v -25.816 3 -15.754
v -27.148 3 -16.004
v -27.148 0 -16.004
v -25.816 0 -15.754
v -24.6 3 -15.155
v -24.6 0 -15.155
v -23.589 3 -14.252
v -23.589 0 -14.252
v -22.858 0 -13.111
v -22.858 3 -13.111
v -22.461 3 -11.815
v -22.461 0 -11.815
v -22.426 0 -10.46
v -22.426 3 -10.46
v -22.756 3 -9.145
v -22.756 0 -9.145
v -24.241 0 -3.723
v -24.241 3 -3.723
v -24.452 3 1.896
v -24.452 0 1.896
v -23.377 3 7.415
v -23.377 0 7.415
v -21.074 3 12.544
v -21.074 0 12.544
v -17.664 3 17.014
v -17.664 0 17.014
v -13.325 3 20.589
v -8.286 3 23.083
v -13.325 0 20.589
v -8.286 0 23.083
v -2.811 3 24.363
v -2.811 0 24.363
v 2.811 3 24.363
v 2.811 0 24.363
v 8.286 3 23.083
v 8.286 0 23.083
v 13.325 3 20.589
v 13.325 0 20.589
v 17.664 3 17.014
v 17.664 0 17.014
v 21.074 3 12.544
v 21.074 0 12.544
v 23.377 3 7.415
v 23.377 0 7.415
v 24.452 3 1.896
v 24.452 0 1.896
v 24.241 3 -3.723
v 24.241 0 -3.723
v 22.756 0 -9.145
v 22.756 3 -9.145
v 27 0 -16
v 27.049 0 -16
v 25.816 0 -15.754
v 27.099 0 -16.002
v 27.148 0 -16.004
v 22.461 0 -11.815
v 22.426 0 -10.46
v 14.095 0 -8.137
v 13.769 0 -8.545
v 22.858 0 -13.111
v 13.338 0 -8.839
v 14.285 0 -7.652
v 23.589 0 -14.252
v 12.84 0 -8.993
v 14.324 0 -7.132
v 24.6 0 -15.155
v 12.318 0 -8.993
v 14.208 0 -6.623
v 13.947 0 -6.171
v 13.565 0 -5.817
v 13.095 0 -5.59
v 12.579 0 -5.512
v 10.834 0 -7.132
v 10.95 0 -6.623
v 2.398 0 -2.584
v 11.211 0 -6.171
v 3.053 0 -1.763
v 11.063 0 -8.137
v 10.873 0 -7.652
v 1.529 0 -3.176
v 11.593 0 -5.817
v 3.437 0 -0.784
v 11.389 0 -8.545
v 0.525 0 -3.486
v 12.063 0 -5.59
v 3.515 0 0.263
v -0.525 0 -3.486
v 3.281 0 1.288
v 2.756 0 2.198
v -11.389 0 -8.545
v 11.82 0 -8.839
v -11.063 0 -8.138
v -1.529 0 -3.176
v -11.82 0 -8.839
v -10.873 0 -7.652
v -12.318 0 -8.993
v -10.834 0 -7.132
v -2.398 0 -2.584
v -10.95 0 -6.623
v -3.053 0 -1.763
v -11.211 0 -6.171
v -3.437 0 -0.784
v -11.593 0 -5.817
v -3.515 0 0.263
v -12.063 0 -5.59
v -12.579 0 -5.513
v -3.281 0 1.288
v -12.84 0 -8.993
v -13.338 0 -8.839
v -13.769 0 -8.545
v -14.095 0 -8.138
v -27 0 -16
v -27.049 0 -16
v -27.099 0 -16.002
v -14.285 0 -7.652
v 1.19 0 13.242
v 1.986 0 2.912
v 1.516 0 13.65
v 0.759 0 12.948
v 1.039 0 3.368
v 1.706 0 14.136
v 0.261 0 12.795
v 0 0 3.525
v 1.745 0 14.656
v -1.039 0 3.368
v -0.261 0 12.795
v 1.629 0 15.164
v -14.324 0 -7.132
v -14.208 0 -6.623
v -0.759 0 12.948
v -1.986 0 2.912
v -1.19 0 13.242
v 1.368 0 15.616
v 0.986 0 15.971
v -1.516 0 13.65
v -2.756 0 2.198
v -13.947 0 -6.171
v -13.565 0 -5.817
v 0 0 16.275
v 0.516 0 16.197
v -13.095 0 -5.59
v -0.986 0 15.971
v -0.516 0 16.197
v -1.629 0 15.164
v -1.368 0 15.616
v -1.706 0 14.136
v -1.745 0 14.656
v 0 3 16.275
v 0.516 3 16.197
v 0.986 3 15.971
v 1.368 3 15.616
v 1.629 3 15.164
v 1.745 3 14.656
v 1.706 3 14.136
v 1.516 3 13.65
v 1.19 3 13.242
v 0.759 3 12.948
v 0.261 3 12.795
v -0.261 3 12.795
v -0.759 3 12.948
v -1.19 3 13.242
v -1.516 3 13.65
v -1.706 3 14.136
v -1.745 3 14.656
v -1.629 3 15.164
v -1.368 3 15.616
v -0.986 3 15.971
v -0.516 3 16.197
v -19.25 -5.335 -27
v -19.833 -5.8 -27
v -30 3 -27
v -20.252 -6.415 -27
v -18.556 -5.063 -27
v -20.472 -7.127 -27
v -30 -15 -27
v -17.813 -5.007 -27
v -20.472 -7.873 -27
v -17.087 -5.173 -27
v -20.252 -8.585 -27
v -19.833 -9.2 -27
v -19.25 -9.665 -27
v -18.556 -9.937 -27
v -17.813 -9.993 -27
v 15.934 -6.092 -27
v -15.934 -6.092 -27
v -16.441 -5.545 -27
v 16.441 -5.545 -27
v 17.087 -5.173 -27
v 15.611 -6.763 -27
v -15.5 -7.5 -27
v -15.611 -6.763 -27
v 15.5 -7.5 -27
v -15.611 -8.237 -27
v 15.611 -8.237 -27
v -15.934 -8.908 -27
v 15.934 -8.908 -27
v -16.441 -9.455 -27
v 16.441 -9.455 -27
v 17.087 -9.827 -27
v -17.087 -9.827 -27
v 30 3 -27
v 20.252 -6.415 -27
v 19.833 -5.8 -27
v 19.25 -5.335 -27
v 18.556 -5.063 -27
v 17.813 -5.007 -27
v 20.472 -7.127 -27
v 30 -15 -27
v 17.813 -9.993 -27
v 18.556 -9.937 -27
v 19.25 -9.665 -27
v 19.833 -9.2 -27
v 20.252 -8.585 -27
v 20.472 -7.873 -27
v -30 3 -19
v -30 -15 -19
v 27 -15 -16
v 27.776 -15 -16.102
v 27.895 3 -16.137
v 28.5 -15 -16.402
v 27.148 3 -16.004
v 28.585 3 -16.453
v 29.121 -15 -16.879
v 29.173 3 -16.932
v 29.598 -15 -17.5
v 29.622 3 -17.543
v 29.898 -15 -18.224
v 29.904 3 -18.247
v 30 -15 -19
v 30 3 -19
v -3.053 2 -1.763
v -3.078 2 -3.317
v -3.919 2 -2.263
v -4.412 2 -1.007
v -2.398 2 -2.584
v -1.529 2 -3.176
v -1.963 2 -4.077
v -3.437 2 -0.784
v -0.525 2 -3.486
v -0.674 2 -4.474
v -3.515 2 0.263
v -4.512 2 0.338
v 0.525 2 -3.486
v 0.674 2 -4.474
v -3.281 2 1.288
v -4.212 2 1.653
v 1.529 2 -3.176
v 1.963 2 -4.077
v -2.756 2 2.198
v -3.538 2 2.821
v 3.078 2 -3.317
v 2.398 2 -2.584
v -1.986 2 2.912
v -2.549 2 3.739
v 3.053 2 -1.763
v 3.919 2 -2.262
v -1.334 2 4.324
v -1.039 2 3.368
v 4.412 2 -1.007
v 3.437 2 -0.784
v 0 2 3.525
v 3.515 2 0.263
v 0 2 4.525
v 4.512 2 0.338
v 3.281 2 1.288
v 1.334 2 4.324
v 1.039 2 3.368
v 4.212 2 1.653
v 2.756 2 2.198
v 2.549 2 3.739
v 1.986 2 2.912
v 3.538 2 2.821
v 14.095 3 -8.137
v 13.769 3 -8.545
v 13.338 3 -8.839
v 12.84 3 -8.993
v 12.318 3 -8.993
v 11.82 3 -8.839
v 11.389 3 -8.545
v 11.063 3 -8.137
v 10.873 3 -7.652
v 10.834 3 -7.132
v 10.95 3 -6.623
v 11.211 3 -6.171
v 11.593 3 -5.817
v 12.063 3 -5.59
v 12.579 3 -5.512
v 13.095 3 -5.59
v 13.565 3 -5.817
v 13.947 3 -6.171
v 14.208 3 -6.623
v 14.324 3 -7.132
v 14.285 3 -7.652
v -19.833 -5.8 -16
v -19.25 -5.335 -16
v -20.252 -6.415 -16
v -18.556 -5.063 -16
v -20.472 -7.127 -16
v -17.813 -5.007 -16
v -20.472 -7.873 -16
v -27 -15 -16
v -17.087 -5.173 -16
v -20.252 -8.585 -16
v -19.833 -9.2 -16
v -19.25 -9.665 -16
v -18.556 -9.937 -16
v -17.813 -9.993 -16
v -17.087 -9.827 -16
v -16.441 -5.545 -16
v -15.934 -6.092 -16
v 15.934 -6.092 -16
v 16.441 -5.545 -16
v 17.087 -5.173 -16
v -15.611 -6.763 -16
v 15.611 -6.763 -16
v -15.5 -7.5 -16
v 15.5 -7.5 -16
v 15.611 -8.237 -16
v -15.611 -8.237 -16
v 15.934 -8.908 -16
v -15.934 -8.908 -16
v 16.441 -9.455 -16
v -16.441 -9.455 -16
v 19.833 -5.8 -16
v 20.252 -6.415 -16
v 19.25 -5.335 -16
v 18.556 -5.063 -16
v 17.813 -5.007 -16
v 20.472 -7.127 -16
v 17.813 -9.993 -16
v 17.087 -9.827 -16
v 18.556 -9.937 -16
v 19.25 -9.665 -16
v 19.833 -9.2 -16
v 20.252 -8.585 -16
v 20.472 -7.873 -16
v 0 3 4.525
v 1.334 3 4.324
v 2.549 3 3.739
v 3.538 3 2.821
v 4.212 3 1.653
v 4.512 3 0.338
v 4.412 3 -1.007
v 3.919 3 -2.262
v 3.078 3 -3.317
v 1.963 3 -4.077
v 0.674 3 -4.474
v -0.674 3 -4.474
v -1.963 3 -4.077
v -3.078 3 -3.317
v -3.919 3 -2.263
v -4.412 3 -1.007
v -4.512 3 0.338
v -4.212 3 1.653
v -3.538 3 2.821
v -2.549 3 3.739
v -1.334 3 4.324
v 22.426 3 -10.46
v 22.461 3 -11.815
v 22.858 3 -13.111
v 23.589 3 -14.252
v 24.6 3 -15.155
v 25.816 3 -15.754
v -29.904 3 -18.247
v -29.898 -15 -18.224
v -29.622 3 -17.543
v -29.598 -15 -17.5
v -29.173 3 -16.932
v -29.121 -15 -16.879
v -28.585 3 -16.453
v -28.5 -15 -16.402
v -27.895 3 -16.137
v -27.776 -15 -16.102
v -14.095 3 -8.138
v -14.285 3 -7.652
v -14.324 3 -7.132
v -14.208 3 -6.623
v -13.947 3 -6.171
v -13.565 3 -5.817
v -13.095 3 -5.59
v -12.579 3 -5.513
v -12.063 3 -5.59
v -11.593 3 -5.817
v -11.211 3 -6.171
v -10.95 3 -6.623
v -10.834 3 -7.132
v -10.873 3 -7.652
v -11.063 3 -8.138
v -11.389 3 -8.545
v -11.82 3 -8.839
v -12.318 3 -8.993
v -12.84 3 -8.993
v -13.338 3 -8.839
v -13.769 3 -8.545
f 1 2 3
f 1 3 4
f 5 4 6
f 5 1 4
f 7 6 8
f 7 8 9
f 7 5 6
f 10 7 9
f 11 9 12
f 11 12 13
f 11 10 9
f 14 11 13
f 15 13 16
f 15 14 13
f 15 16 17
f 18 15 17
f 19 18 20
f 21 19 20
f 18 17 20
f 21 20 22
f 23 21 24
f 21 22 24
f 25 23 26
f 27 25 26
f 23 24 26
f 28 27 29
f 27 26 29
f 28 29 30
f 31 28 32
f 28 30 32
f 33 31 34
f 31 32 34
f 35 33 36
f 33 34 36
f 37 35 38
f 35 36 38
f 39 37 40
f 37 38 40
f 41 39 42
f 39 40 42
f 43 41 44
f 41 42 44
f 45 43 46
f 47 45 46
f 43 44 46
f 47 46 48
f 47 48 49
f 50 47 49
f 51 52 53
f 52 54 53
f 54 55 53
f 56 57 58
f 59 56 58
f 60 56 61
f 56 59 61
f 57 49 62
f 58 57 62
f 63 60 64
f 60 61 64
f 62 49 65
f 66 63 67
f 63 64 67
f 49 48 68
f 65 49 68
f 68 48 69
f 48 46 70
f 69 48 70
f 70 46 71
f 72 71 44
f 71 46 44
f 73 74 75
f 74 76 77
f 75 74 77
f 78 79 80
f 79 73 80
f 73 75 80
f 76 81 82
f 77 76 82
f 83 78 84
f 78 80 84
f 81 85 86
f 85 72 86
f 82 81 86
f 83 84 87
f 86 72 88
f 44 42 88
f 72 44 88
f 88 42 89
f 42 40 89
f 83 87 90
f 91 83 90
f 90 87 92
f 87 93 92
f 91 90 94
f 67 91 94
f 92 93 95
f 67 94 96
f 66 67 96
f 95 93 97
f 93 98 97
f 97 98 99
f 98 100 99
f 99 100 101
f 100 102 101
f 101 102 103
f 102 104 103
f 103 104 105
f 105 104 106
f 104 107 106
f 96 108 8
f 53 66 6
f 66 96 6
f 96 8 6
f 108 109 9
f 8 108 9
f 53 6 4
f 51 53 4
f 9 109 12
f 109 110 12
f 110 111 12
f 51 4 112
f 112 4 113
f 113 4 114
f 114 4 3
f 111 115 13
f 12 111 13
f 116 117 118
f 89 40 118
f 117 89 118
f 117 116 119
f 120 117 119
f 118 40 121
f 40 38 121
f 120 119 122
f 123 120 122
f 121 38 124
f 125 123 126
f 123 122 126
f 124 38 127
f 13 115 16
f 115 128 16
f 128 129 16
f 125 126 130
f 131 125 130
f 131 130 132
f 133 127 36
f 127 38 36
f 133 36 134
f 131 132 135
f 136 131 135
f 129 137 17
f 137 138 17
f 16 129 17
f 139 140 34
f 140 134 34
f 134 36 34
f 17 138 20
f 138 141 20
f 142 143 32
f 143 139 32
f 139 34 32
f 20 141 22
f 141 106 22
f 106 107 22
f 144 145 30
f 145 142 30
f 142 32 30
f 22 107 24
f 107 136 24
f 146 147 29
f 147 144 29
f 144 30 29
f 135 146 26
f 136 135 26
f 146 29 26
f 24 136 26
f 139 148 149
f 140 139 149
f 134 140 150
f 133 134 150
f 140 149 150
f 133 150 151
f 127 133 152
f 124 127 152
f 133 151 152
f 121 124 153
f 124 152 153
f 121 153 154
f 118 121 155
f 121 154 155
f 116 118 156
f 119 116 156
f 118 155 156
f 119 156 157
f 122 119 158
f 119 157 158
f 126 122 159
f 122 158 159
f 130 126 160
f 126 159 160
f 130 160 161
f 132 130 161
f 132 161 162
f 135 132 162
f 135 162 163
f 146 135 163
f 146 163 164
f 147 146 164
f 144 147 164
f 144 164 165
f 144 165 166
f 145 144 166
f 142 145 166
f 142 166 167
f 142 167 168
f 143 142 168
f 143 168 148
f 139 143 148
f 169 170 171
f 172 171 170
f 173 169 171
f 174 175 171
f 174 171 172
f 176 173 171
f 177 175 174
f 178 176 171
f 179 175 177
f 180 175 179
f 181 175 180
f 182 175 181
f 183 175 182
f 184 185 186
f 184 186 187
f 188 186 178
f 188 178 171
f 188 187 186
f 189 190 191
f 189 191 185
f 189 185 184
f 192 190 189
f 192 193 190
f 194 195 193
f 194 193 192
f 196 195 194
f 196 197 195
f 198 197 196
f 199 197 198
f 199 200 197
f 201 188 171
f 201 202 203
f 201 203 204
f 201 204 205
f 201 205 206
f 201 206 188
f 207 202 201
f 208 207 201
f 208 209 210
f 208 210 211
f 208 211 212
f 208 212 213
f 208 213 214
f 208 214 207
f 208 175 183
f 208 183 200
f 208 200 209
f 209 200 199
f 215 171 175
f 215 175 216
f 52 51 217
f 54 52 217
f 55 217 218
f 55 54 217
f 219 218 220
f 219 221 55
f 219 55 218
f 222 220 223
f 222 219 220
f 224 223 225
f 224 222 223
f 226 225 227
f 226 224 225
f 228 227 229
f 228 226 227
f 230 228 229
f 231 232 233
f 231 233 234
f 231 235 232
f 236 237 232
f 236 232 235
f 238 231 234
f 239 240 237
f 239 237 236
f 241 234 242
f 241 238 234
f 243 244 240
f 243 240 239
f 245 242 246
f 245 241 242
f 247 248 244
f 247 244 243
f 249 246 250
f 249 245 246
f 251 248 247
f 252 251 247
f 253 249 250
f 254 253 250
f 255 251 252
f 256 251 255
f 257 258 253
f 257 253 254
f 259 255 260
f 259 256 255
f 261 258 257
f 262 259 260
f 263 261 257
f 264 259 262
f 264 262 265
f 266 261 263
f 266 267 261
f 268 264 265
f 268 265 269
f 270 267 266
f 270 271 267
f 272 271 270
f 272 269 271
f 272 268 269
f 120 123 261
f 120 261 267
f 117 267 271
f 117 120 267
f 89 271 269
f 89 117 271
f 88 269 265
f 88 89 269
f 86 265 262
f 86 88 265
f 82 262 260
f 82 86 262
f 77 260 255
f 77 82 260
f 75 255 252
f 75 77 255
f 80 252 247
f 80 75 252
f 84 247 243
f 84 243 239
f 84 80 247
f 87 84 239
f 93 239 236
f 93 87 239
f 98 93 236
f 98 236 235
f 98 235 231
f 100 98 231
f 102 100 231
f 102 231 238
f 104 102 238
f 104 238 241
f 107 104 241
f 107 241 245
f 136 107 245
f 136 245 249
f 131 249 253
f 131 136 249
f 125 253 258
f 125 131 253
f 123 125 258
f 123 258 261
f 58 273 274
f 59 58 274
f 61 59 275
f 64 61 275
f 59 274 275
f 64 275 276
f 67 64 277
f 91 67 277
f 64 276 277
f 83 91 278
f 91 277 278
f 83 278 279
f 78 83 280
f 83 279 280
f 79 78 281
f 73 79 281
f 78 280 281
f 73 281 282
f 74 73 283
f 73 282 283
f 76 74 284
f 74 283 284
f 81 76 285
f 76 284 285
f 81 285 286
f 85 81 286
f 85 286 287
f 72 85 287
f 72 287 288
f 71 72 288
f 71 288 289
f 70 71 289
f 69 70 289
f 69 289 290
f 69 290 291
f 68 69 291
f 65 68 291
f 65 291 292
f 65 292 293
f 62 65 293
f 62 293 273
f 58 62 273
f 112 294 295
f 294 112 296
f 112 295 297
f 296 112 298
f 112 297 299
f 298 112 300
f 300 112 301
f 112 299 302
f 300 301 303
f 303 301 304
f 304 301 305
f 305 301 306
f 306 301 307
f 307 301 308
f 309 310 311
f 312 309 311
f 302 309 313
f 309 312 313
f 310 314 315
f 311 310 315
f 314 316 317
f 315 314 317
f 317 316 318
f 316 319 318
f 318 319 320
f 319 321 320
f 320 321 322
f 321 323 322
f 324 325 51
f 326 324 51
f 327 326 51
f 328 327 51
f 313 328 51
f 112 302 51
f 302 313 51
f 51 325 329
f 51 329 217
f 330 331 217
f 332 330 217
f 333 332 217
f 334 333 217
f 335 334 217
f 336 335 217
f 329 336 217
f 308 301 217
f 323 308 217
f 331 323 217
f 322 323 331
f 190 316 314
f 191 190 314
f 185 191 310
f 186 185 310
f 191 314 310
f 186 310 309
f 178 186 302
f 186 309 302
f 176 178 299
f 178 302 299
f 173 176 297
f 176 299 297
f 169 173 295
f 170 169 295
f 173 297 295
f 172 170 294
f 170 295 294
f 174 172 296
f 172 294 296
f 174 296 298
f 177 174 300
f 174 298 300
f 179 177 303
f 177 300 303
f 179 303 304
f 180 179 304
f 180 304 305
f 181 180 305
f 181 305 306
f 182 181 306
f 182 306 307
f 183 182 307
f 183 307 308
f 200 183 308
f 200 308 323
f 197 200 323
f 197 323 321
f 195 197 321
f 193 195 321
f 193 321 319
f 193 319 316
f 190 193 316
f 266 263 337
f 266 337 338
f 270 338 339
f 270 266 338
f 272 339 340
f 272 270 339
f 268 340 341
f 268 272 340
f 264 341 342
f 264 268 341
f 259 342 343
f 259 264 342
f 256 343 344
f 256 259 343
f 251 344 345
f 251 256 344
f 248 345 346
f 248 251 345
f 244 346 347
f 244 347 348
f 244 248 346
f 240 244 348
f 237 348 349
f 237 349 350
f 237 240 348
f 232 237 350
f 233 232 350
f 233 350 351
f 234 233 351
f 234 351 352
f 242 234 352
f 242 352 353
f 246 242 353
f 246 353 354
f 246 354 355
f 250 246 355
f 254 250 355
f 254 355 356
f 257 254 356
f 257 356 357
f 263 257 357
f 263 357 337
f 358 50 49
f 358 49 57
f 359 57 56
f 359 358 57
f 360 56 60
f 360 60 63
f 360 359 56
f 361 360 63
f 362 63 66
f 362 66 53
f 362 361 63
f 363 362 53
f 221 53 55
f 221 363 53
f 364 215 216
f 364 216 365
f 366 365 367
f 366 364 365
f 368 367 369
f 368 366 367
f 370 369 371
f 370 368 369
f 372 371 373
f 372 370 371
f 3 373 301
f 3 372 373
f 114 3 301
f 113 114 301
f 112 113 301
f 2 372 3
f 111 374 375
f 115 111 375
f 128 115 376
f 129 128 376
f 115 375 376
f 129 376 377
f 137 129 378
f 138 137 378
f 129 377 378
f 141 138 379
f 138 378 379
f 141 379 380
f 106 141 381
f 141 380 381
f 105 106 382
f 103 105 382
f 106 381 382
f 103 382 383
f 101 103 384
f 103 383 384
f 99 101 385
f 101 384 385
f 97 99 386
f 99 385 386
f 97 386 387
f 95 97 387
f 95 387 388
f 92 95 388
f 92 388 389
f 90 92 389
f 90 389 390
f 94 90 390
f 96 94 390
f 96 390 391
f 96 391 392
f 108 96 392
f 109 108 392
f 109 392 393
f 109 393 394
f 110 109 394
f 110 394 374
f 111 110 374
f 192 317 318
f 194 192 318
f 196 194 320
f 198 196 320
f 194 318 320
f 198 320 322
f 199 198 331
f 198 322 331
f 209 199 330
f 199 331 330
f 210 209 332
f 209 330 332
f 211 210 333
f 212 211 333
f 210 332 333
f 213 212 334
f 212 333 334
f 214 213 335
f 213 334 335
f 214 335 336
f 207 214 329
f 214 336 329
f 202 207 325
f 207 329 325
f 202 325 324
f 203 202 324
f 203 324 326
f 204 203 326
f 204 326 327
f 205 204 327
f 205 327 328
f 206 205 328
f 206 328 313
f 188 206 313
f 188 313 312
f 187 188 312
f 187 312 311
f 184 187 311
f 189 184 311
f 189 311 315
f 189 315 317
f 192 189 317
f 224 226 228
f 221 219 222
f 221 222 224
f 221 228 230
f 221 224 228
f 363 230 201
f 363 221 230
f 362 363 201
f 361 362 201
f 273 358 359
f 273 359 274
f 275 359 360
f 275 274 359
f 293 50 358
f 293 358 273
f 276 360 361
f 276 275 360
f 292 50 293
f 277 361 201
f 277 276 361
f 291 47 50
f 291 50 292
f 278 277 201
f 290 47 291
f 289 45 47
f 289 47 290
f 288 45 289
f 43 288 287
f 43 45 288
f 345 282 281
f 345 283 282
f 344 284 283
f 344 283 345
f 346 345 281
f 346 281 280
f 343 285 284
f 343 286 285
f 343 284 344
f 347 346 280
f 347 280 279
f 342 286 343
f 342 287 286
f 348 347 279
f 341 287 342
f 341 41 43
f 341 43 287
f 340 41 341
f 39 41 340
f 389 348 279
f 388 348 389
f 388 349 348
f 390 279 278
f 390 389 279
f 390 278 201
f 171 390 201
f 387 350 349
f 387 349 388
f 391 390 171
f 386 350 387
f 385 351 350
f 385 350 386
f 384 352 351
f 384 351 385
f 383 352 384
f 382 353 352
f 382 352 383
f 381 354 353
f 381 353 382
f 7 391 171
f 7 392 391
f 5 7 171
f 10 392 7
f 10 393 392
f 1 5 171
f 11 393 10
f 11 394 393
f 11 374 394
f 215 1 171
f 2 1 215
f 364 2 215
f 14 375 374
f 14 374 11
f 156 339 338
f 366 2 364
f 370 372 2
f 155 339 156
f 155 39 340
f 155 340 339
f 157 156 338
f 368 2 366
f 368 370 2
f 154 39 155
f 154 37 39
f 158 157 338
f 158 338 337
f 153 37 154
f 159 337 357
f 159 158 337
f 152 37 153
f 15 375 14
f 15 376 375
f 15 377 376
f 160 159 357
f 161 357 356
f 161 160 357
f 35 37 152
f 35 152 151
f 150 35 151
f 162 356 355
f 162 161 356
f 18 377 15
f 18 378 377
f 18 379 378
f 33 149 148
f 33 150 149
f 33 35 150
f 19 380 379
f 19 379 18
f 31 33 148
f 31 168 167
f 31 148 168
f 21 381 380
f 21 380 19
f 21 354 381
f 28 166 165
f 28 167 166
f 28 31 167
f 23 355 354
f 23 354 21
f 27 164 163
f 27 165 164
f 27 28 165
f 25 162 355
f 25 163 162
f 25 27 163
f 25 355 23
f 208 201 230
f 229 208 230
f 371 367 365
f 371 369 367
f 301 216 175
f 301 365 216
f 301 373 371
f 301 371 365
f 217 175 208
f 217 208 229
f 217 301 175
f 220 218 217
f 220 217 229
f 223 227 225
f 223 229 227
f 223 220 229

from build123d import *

# Parameters (mm, degrees)
SKETCH1_R                       = 4.525
SKETCH1_R_2                     = 3.525
BOSS_EXTRUDE1_DEPTH             = 2
SKETCH1_5_R                     = 24.525
SKETCH1_5_R_2                   = 4.525
BOSS_EXTRUDE3_DEPTH             = 3
SKETCH2_R                       = 1.75
CUT_EXTRUDE1_DEPTH              = 4.5
CIRPATTERN1_COUNT               = 3
SKETCH9_W                       = 60
SKETCH9_H                       = 11
BOSS_EXTRUDE7_DEPTH             = 15
BOSS_EXTRUDE7_DIRECTION_2_REACH = 36.813
CUT_EXTRUDE3_REACH              = 54.605
SKETCH10_R                      = 2.5
FILLET4_R                       = 3
FILLET5_R                       = 5


with BuildPart() as part:
    # Sketch1 → Boss-Extrude1 (new body)
    with BuildSketch(Plane(origin=(0, 0, 0), x_dir=(1, 0, 0), z_dir=(0, 1, 0))):
        with Locations(Location((0, 0, 0), (0, 0, 270))):
            Circle(SKETCH1_R)
        with Locations(Location((0, 0, 0), (0, 0, 270))):
            Circle(SKETCH1_R_2, mode=Mode.SUBTRACT)
    extrude(amount=BOSS_EXTRUDE1_DEPTH)

    # Sketch1<5> → Boss-Extrude3 (add)
    with BuildSketch(Plane(origin=(0, 0, 0), x_dir=(1, 0, 0), z_dir=(0, 1, 0))):
        with Locations(Location((0, 0, 0), (0, 0, 270))):
            Circle(SKETCH1_5_R)
        with Locations(Location((0, 0, 0), (0, 0, 270))):
            Circle(SKETCH1_5_R_2, mode=Mode.SUBTRACT)
    extrude(amount=BOSS_EXTRUDE3_DEPTH)

    # Sketch2 → Cut-Extrude1 (cut)
    with BuildSketch(Plane(origin=(0, 3, 0), x_dir=(1, 0, 0), z_dir=(0, 1, 0))):
        with Locations(Location((0, -14.525, 0), (0, 0, 270))):
            Circle(SKETCH2_R)
    cut_extrude1 = extrude(amount=-CUT_EXTRUDE1_DEPTH, mode=Mode.SUBTRACT)

    # CirPattern1: Cut-Extrude1 ×3 about axis
    cirpattern1_axis = Axis((0, 0, 0), (0, 1, 0))
    for i in range(1, CIRPATTERN1_COUNT):
        add(cut_extrude1.rotate(cirpattern1_axis, i * 360 / CIRPATTERN1_COUNT), mode=Mode.SUBTRACT)

    # Sketch9 → Boss-Extrude7 (add)
    with BuildSketch(Plane.XZ):
        with Locations((0, -21.5)):
            Rectangle(SKETCH9_W, SKETCH9_H)
    extrude(amount=BOSS_EXTRUDE7_DEPTH)

    # Boss-Extrude7 direction 2: up to this face of the body (flat: up to its plane)
    boss_extrude7_direction_2_end = Plane(part.part.faces().sort_by_distance((0, 3, -23.831328248))[0])
    # Sketch9 → Boss-Extrude7 direction 2 (add, up to the picked face)
    with BuildSketch(Plane.XZ, mode=Mode.PRIVATE) as boss_extrude7_direction_2_sk1:
        with Locations((0, -21.5)):
            Rectangle(SKETCH9_W, SKETCH9_H)
    boss_extrude7_direction_2_tool1 = split(extrude(boss_extrude7_direction_2_sk1.sketch, amount=-BOSS_EXTRUDE7_DIRECTION_2_REACH, mode=Mode.PRIVATE), bisect_by=boss_extrude7_direction_2_end, keep=Keep.BOTH, mode=Mode.PRIVATE)
    add(boss_extrude7_direction_2_tool1.solids().sort_by(Axis((0, 0, -21.5), (0, 1, 0)))[0])

    # Sketch10 → Cut-Extrude3 (cut, up to next)
    with BuildSketch(Plane.XY.offset(-16), mode=Mode.PRIVATE) as cut_extrude3_sk1:
        with Locations((-18, -7.5)):
            Circle(SKETCH10_R)
    cut_extrude3_tool1 = extrude(cut_extrude3_sk1.sketch, amount=-CUT_EXTRUDE3_REACH, mode=Mode.PRIVATE) & part.part
    # Sketch10 → Cut-Extrude3 (cut, up to next)
    with BuildSketch(Plane.XY.offset(-16), mode=Mode.PRIVATE) as cut_extrude3_sk2:
        with Locations(Location((18, -7.5, 0), (0, 0, 180))):
            Circle(SKETCH10_R)
    cut_extrude3_tool2 = extrude(cut_extrude3_sk2.sketch, amount=-CUT_EXTRUDE3_REACH, mode=Mode.PRIVATE) & part.part
    add(cut_extrude3_tool1.solids().sort_by_distance((-18, -7.5, -16))[0], mode=Mode.SUBTRACT)
    add(cut_extrude3_tool2.solids().sort_by_distance((18, -7.5, -16))[0], mode=Mode.SUBTRACT)

    # Fillet4
    fillet4_edges = [part.edges().sort_by_distance(p)[0] for p in [
        (-30, -6, -16),
        (30, -6, -16),
    ]]
    fillet(fillet4_edges, radius=FILLET4_R)

    # Fillet5
    # the kernel refuses this fillet: 5 mm, written as the material it adds along each edge
    with BuildSketch(Plane(origin=(-18.586974606, 3, -16), x_dir=(-0.999999908254526, 0, -0.0004283584240869523), z_dir=(0, -1, 0))) as fillet5_piece_1:
        with BuildLine():
            CenterArc((8.806331501, -4.993993224), FILLET5_R, 92.808774222, 109.061067494)
            Line((4.166169243, -6.856489993), (3.702153017, -7.04273967))
            ThreePointArc((3.702153017, -7.04273967), (1.938057952, -3.516366711), (-0.379079034, -0.326035406))
            Line((-0.379079034, -0.326035406), (0.000214179, 0.499999954))
            ThreePointArc((0.000214179, 0.499999954), (8.413238801, 0.496396164), (8.536816511, 0.499399322))
            Line((8.536816511, 0.499399322), (8.561317874, 0))
        make_face()
    extrude(amount=3)
    with BuildSketch(Plane(origin=(18.586974606, 3, -16), x_dir=(0.999999908254526, 0, -0.0004283584240865375), z_dir=(0, -1, 0))) as fillet5_piece_2:
        with BuildLine():
            CenterArc((8.806331501, 4.993993224), FILLET5_R, 158.130158283, 109.061067494)
            Line((4.166169243, 6.856489993), (3.702153017, 7.04273967))
            ThreePointArc((3.702153017, 7.04273967), (1.938057952, 3.516366711), (-0.379079034, 0.326035406))
            Line((-0.379079034, 0.326035406), (0.000214179, -0.499999954))
            ThreePointArc((0.000214179, -0.499999954), (8.413238801, -0.496396164), (8.536816511, -0.499399322))
            Line((8.536816511, -0.499399322), (8.561317874, 0))
        make_face()
    extrude(amount=3)


solid = part.part
